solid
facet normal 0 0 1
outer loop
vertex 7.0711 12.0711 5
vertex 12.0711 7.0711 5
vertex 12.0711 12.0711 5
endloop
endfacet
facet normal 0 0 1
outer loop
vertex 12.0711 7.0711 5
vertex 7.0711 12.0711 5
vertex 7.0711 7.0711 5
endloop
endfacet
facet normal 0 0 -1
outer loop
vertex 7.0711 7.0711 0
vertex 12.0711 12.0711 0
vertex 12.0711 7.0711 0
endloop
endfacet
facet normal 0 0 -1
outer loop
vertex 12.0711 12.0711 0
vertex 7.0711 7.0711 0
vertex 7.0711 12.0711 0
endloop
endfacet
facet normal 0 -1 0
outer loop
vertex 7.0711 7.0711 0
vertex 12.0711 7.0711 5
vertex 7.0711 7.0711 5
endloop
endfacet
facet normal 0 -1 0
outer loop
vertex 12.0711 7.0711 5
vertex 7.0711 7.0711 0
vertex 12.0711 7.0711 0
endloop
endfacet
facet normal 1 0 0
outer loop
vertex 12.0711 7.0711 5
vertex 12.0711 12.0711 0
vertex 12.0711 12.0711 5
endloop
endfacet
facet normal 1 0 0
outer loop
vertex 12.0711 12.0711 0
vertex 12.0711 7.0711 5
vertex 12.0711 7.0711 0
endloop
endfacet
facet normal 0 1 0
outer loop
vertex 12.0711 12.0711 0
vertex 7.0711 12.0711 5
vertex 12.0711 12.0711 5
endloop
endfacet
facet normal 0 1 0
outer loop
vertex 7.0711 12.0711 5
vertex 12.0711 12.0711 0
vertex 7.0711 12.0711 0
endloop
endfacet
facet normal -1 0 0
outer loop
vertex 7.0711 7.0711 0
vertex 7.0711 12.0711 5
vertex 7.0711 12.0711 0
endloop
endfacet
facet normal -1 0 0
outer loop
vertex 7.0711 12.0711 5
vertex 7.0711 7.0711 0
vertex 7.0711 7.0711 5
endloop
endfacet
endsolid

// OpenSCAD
x = cos(45) * 10;
y = sin(45) * 10;
translate([x, y, 0]) cube([5, 5, 5]);
